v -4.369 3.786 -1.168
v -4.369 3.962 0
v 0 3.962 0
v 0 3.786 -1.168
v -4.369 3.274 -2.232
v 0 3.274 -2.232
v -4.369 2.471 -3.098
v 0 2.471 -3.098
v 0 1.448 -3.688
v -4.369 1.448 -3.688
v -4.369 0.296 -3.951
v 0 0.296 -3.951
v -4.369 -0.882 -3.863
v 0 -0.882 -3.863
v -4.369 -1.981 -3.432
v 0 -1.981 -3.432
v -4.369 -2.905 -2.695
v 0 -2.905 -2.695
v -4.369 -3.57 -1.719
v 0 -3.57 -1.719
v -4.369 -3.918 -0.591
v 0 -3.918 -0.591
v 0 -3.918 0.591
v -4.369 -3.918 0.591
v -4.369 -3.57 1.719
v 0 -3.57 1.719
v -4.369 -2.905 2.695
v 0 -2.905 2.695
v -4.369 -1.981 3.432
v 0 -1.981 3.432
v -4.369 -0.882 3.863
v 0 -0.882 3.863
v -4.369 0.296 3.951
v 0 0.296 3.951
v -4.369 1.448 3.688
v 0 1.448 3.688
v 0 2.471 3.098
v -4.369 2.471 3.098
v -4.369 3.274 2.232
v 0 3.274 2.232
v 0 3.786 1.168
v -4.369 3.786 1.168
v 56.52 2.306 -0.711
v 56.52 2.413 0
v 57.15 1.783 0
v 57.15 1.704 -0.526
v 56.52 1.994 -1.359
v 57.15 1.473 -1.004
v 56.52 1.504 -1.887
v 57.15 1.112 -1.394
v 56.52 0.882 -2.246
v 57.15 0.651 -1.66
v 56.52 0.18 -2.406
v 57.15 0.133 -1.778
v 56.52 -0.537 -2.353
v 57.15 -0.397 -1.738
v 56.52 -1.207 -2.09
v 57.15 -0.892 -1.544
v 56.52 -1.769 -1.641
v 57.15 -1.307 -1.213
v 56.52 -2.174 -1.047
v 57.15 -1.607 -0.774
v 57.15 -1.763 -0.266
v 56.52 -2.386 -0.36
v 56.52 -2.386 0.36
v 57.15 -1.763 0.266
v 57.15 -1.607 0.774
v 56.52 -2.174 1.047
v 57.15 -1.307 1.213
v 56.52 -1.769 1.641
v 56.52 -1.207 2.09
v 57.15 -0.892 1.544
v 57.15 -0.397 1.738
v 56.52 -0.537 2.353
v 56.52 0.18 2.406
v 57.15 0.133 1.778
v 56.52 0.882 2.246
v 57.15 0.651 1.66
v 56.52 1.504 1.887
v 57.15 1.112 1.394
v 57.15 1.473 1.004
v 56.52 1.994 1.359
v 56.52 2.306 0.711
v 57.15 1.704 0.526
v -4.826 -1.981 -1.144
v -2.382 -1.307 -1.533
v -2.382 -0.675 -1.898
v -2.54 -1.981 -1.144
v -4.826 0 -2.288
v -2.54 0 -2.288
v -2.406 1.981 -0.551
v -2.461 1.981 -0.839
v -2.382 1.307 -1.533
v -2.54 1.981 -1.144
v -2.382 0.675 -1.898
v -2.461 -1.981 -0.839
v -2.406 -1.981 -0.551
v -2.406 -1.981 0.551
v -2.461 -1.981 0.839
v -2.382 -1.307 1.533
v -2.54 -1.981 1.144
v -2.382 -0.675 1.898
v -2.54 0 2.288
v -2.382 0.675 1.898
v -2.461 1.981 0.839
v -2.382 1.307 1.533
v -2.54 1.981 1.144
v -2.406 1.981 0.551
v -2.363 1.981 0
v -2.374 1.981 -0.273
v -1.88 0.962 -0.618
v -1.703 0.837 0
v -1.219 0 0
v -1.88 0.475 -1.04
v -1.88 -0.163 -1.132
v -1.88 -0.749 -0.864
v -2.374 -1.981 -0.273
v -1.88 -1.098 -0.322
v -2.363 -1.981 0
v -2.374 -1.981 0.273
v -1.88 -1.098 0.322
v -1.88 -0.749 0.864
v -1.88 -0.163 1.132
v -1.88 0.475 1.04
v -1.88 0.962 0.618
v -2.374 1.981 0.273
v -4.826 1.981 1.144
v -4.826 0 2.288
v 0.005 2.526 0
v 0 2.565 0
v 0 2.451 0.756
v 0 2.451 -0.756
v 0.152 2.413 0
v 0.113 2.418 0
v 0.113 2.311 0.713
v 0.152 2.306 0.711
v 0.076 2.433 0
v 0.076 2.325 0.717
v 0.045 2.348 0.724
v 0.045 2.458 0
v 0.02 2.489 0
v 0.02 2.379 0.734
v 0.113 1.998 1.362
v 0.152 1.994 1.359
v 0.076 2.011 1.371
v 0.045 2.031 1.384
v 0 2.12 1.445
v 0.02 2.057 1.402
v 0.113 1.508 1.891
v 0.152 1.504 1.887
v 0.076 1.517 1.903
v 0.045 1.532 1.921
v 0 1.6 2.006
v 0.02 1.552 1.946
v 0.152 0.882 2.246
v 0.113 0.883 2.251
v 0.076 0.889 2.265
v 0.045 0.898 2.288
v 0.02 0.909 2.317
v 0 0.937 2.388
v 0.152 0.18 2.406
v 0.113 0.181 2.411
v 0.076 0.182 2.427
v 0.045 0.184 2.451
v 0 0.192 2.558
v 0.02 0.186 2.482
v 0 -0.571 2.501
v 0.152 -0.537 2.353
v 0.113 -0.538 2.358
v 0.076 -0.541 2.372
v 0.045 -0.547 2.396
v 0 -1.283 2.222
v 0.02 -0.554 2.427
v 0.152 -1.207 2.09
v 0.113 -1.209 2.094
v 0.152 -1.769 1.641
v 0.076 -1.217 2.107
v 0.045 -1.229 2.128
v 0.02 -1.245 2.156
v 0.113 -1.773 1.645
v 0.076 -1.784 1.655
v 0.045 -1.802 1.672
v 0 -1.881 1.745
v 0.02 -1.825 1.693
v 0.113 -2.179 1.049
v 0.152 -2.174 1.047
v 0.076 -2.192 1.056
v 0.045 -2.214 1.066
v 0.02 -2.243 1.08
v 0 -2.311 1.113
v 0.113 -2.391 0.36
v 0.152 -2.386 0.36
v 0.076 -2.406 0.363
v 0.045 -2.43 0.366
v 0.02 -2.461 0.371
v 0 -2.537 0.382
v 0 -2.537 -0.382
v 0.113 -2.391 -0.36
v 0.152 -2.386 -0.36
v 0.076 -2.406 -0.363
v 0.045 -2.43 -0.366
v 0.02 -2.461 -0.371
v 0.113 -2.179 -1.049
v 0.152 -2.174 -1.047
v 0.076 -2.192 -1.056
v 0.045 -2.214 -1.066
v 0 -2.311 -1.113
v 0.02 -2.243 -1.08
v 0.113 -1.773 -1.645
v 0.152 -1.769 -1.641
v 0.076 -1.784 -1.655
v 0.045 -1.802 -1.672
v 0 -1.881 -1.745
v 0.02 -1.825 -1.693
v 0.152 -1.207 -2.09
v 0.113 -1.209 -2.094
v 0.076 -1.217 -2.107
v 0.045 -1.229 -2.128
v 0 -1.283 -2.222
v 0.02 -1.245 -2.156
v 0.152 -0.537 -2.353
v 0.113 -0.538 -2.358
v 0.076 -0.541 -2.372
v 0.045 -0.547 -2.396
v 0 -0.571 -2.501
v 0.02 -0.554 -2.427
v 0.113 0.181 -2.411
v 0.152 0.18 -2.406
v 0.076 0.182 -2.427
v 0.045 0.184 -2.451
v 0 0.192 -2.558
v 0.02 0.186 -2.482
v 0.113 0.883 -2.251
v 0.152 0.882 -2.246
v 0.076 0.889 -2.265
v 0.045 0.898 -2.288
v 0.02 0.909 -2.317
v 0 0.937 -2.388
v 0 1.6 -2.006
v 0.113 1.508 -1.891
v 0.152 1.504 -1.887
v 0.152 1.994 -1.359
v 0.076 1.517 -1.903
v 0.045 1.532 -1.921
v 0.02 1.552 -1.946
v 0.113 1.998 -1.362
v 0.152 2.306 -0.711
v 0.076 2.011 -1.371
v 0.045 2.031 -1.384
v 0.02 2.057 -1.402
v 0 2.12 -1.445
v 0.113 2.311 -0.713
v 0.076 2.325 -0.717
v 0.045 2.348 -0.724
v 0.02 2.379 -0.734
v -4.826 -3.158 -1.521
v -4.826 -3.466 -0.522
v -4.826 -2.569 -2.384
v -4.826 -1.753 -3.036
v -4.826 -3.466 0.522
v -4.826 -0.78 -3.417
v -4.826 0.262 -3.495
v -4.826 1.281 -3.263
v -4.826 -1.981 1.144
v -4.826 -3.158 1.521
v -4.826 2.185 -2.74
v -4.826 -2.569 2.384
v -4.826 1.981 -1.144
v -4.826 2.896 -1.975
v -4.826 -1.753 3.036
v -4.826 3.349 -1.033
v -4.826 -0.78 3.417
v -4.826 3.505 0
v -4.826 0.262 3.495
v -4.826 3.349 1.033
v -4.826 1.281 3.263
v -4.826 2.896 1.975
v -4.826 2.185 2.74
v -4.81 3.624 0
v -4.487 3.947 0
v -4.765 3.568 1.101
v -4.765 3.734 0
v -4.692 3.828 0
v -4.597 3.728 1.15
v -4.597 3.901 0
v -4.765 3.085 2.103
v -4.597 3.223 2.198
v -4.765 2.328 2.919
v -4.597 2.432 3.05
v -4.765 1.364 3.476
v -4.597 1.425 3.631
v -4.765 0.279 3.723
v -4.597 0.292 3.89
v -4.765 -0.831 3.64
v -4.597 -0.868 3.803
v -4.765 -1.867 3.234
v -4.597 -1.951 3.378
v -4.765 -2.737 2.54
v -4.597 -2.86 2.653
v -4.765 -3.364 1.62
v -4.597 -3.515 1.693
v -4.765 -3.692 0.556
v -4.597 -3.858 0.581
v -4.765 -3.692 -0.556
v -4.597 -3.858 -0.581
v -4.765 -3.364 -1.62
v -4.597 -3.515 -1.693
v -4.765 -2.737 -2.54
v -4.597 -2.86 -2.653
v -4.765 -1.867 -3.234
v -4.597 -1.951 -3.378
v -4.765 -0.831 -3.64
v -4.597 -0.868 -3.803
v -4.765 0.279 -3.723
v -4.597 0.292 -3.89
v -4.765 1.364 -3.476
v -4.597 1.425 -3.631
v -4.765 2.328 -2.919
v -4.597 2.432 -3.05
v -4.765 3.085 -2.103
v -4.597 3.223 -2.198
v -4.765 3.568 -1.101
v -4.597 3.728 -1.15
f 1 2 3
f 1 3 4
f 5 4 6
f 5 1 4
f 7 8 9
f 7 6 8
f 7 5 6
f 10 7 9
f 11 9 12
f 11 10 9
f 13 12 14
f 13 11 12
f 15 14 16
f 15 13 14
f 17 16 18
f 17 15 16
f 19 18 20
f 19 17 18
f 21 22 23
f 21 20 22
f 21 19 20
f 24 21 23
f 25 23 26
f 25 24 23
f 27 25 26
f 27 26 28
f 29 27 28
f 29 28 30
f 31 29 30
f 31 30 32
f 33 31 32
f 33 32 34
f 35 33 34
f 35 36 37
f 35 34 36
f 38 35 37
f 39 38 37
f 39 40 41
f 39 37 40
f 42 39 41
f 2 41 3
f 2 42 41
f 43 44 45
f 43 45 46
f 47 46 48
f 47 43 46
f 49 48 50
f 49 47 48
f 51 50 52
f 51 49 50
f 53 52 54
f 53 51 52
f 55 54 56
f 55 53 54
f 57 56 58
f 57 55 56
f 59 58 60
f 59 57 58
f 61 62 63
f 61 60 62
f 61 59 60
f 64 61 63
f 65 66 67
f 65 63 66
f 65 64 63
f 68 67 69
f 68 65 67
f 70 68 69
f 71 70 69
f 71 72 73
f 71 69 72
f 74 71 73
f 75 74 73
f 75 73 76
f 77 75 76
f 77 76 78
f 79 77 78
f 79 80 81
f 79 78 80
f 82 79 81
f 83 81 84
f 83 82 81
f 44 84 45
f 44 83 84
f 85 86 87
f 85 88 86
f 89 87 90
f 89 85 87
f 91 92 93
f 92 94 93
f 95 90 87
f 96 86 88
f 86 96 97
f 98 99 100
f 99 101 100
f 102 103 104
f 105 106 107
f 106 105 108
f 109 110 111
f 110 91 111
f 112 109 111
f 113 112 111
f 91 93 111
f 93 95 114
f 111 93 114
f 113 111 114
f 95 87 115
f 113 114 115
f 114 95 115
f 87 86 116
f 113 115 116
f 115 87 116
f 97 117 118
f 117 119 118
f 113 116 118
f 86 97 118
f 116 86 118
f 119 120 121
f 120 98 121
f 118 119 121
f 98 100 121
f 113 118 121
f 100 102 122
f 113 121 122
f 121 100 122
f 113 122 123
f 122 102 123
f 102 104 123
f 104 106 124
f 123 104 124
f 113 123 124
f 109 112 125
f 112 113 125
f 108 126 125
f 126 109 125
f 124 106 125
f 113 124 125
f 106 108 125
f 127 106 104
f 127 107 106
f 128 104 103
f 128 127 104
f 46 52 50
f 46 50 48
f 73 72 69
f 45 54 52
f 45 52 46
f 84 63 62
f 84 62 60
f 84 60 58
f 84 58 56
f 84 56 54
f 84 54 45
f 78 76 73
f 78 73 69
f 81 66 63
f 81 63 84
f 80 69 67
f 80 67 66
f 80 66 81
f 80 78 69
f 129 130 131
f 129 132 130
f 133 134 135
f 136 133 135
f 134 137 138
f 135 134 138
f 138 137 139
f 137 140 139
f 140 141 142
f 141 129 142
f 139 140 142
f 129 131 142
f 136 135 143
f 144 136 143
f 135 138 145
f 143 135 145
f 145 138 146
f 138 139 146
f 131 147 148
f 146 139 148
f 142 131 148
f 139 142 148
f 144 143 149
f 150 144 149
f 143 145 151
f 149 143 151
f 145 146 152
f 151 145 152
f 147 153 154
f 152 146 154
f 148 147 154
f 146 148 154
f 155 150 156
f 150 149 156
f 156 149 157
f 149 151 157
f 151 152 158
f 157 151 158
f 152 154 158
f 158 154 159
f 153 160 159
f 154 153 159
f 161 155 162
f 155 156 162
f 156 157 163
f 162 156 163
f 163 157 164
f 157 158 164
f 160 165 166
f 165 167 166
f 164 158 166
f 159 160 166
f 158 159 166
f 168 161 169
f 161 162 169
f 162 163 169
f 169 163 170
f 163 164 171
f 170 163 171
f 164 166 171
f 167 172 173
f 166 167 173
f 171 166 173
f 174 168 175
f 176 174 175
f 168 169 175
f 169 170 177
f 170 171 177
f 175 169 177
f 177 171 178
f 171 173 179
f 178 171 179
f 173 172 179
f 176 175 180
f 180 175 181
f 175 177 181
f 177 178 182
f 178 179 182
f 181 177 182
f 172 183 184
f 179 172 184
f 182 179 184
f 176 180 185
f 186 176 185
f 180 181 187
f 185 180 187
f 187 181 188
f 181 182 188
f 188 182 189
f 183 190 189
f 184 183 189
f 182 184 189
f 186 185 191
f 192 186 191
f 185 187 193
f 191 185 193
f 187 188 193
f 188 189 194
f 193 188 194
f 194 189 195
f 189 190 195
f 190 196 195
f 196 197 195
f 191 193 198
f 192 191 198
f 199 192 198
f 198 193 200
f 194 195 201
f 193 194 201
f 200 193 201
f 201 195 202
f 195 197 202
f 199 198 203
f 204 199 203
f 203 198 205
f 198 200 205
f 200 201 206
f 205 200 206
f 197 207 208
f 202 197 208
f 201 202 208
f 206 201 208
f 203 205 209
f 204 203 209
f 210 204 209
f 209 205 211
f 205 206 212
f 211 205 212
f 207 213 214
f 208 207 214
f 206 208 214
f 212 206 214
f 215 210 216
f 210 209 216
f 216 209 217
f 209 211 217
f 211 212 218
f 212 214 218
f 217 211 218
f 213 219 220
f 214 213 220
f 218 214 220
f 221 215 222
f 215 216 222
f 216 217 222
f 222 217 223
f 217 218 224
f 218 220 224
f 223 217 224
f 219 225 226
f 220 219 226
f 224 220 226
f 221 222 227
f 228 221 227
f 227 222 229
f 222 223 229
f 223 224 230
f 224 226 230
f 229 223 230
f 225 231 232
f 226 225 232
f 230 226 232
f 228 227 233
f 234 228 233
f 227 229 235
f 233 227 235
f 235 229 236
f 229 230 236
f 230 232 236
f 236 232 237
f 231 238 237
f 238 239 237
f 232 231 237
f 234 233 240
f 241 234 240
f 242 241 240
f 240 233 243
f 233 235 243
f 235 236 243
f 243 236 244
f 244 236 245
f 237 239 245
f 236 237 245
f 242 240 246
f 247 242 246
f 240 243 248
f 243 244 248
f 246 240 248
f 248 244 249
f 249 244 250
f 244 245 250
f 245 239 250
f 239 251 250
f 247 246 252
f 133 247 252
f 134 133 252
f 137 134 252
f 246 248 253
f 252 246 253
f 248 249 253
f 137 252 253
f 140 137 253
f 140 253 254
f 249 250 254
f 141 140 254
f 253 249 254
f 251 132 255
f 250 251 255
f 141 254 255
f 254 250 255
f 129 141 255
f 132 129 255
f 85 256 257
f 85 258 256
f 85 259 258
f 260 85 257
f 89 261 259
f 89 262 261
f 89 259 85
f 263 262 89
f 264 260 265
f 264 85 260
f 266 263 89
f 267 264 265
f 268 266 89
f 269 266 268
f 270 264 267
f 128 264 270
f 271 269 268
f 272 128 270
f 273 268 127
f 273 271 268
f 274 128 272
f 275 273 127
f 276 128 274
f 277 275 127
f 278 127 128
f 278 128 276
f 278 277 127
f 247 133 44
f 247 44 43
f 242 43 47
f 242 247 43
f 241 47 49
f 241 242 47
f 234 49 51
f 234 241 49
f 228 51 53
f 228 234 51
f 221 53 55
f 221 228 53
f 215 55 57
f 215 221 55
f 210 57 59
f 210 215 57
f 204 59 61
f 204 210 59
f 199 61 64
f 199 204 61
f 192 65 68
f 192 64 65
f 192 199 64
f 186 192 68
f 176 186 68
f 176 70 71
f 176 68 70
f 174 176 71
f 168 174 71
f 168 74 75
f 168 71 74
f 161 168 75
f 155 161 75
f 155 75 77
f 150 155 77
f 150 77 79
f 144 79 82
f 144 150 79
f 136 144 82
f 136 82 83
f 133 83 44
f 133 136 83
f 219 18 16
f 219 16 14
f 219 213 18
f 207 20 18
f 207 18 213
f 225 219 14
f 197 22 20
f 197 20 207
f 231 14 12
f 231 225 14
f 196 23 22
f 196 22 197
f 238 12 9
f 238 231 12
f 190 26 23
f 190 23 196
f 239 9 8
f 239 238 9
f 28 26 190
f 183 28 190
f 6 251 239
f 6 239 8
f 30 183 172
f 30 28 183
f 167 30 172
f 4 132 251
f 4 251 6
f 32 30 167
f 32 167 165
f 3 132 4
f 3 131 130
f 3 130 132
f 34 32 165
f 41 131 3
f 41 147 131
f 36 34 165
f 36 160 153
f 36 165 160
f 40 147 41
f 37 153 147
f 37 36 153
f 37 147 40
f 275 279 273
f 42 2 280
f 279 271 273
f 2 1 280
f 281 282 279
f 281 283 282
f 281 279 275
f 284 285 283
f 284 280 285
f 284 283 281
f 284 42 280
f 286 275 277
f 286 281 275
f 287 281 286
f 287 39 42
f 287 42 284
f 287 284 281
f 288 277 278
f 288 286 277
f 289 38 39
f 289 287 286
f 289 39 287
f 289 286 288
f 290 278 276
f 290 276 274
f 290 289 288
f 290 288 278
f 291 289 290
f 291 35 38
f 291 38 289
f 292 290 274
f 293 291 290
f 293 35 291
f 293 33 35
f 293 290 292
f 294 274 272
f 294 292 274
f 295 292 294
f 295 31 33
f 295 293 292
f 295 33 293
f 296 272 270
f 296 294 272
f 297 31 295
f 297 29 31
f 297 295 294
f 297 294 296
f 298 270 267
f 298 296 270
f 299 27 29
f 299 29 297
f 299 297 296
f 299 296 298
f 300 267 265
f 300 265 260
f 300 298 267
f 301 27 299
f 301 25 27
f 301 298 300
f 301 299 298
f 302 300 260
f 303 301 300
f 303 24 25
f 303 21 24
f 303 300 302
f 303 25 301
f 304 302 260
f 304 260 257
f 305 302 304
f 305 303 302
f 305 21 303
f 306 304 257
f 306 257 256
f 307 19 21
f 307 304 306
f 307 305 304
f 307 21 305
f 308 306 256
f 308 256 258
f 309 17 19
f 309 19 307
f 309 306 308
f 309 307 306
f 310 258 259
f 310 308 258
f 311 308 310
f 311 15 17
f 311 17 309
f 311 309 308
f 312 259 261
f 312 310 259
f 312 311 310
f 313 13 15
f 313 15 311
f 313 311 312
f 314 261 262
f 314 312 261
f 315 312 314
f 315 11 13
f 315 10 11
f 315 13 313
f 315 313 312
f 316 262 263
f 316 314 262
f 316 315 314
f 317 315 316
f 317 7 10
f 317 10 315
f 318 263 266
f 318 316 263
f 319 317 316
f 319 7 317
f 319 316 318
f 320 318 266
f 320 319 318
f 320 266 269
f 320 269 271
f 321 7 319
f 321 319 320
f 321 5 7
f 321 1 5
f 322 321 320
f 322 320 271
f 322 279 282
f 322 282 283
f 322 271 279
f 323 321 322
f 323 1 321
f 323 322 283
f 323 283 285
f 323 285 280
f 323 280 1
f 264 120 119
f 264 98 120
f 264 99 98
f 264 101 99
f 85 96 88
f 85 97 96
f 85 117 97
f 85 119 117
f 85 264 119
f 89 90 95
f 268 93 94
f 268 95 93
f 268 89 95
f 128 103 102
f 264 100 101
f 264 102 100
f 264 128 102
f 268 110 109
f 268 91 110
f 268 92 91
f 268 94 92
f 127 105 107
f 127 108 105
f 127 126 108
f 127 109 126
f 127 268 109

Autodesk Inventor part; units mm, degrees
ref_plane "YZ Plane" through (0, 0, 0) normal (1, 0, 0) x (0, 1, 0)
ref_plane "XZ Plane" through (0, 0, 0) normal (0, 1, 0) x (-1, 0, 0)
sketch "Sketch1" plane through (0, 0, 0) normal (0, 0, 1) x (1, 0, 0)
  line L0 (-1.2192, 0) -> (57.15, 0)
  line L1 (57.15, 0) -> (57.15, 2.413)
  line L2 (57.15, 2.413) -> (35.052, 2.413)
  line L3 (35.052, 2.413) -> (32.406, 2.413)
  line L4 (32.406, 2.413) -> (0, 2.413)
  line L5 (0, 2.413) -> (0, 3.9624)
  line L6 (0, 3.9624) -> (-4.826, 3.9624)
  line L7 (-4.826, 3.9624) -> (-4.826, 2.2877)
  line L8 (-4.826, 2.2877) -> (-2.54, 2.2877)
  line L9 (-2.54, 2.2877) -> (-1.2192, 0)
  line L10 (-17.2212, 0) -> (69.5452, 0) projected
  line L11 (0, -0.7925) -> (0, 4.7549) projected
  line L12 (35.052, 2.413) -> (0, 2.413) construction
  dimension "d1" = 22.098
  dimension "d2" = 2.646
  dimension "d3" = 4.826
  dimension "d4" = 2.286
  dimension "d5" = 60
  dimension "d6" = 4.826
  dimension "d7" = 4.826
  dimension "d8" = 4.5754
  dimension "d9" = 7.9248
  dimension "d26" = 57.15
revolve "Body" add sketch "Sketch1" angle 360 about axis through (-1.2192, 0, 0) along (1, 0, 0)
sketch "Sketch2" plane through (-4.826, 0, 0) normal (-1, 0, 0) x (0, 0, 1)
  circle A0 centre (0, 0) radius 2.2877 projected
  line L0 (0, -5.5474) -> (0, 5.5474) projected
  line L1 (-5.5474, 0) -> (5.5474, 0) projected
  line L2 (2.2877, 0) -> (1.1438, -1.9812)
  line L3 (1.1438, -1.9812) -> (-1.1438, -1.9812)
  line L4 (-1.1438, -1.9812) -> (-2.2877, 0)
  line L5 (-2.2877, 0) -> (-1.1438, 1.9812)
  line L6 (-1.1438, 1.9812) -> (1.1438, 1.9812)
  line L7 (1.1438, 1.9812) -> (2.2877, 0)
extrude "Slot" add sketch "Sketch2" against normal up to next contours L7 A0 | A0 L2 | L6 L0 A0 | A0 L0 L3 | L0 L6 A0 | A0 L3 L0 | L4 A0 | A0 L5
fillet "Fillet1" radius 0.4572 1 edges at (-4.826, -3.9624, 0)
thread "Thread" size "10-24 UNC" class "2A" standard "ANSI Unified Screw Threads" length 22.098
chamfer "Chamfer1" distance 0.6299 distance2 0.6299 1 edges at (57.15, -2.413, 0) measured on face at (57.15, -0.4231, -0.1925)
ref_plane "Work Plane1" through (29, 0, 0) normal (0, -1, 0) x (1, 0, 0)
fillet "Fillet2" radius 0.1524 1 edges at (0, -2.413, 0)
equation "\"d1\" = GEL"
equation "\"d3\" = KOH"
equation "\"d4\" = INTI"
equation "\"d6\" = GD"
equation "\"d7\" = BDM"
equation "\"d8\" = 1.1547 * SW"
equation "\"d9\" = KOD"
equation "\"d26\" = NLG"
equation "\"d30\" = R"
equation "\"d17\" = RR"
equation "\"d13\" = GEL"
equation "\"d15\" = -0.5 * SPD + 0.5 * GD"
equation "\"d16\" = GUL"
equation "\"GD\" = 4.826"
equation "\"NLG\" = 57.15"
equation "\"GEL\" = 22.098"
equation "\"KOD\" = 7.9248"
equation "\"KOH\" = 4.826"
equation "\"INTI\" = 2.286"
equation "\"GAL\" = 2.64592"
equation "\"GUL\" = 0.62992"
equation "\"BDM\" = 4.826"
equation "\"SW\" = 3.9624"
equation "\"RR\" = 0.4572"
equation "\"SPD\" = 3.56616"
equation "\"R\" = 0.1524"
equation "\"PHH\" = 0.127"
equation "\"GD1\" = SPD"
equation "\"THREADDIA\" = 4.826"
equation "\"FAWI\" = 45deg"
equation "\"KOH1\" = 4.3434"
equation "\"NND\" = 4.826"
equation "\"TOA\" = 30deg"
equation "\"E0\" = 1.155 * SW"
properties part number "ANSI B18.3 - No. 10 - 24 UNC - 2 1/4 HS HCS" material "Steel, Mild"
